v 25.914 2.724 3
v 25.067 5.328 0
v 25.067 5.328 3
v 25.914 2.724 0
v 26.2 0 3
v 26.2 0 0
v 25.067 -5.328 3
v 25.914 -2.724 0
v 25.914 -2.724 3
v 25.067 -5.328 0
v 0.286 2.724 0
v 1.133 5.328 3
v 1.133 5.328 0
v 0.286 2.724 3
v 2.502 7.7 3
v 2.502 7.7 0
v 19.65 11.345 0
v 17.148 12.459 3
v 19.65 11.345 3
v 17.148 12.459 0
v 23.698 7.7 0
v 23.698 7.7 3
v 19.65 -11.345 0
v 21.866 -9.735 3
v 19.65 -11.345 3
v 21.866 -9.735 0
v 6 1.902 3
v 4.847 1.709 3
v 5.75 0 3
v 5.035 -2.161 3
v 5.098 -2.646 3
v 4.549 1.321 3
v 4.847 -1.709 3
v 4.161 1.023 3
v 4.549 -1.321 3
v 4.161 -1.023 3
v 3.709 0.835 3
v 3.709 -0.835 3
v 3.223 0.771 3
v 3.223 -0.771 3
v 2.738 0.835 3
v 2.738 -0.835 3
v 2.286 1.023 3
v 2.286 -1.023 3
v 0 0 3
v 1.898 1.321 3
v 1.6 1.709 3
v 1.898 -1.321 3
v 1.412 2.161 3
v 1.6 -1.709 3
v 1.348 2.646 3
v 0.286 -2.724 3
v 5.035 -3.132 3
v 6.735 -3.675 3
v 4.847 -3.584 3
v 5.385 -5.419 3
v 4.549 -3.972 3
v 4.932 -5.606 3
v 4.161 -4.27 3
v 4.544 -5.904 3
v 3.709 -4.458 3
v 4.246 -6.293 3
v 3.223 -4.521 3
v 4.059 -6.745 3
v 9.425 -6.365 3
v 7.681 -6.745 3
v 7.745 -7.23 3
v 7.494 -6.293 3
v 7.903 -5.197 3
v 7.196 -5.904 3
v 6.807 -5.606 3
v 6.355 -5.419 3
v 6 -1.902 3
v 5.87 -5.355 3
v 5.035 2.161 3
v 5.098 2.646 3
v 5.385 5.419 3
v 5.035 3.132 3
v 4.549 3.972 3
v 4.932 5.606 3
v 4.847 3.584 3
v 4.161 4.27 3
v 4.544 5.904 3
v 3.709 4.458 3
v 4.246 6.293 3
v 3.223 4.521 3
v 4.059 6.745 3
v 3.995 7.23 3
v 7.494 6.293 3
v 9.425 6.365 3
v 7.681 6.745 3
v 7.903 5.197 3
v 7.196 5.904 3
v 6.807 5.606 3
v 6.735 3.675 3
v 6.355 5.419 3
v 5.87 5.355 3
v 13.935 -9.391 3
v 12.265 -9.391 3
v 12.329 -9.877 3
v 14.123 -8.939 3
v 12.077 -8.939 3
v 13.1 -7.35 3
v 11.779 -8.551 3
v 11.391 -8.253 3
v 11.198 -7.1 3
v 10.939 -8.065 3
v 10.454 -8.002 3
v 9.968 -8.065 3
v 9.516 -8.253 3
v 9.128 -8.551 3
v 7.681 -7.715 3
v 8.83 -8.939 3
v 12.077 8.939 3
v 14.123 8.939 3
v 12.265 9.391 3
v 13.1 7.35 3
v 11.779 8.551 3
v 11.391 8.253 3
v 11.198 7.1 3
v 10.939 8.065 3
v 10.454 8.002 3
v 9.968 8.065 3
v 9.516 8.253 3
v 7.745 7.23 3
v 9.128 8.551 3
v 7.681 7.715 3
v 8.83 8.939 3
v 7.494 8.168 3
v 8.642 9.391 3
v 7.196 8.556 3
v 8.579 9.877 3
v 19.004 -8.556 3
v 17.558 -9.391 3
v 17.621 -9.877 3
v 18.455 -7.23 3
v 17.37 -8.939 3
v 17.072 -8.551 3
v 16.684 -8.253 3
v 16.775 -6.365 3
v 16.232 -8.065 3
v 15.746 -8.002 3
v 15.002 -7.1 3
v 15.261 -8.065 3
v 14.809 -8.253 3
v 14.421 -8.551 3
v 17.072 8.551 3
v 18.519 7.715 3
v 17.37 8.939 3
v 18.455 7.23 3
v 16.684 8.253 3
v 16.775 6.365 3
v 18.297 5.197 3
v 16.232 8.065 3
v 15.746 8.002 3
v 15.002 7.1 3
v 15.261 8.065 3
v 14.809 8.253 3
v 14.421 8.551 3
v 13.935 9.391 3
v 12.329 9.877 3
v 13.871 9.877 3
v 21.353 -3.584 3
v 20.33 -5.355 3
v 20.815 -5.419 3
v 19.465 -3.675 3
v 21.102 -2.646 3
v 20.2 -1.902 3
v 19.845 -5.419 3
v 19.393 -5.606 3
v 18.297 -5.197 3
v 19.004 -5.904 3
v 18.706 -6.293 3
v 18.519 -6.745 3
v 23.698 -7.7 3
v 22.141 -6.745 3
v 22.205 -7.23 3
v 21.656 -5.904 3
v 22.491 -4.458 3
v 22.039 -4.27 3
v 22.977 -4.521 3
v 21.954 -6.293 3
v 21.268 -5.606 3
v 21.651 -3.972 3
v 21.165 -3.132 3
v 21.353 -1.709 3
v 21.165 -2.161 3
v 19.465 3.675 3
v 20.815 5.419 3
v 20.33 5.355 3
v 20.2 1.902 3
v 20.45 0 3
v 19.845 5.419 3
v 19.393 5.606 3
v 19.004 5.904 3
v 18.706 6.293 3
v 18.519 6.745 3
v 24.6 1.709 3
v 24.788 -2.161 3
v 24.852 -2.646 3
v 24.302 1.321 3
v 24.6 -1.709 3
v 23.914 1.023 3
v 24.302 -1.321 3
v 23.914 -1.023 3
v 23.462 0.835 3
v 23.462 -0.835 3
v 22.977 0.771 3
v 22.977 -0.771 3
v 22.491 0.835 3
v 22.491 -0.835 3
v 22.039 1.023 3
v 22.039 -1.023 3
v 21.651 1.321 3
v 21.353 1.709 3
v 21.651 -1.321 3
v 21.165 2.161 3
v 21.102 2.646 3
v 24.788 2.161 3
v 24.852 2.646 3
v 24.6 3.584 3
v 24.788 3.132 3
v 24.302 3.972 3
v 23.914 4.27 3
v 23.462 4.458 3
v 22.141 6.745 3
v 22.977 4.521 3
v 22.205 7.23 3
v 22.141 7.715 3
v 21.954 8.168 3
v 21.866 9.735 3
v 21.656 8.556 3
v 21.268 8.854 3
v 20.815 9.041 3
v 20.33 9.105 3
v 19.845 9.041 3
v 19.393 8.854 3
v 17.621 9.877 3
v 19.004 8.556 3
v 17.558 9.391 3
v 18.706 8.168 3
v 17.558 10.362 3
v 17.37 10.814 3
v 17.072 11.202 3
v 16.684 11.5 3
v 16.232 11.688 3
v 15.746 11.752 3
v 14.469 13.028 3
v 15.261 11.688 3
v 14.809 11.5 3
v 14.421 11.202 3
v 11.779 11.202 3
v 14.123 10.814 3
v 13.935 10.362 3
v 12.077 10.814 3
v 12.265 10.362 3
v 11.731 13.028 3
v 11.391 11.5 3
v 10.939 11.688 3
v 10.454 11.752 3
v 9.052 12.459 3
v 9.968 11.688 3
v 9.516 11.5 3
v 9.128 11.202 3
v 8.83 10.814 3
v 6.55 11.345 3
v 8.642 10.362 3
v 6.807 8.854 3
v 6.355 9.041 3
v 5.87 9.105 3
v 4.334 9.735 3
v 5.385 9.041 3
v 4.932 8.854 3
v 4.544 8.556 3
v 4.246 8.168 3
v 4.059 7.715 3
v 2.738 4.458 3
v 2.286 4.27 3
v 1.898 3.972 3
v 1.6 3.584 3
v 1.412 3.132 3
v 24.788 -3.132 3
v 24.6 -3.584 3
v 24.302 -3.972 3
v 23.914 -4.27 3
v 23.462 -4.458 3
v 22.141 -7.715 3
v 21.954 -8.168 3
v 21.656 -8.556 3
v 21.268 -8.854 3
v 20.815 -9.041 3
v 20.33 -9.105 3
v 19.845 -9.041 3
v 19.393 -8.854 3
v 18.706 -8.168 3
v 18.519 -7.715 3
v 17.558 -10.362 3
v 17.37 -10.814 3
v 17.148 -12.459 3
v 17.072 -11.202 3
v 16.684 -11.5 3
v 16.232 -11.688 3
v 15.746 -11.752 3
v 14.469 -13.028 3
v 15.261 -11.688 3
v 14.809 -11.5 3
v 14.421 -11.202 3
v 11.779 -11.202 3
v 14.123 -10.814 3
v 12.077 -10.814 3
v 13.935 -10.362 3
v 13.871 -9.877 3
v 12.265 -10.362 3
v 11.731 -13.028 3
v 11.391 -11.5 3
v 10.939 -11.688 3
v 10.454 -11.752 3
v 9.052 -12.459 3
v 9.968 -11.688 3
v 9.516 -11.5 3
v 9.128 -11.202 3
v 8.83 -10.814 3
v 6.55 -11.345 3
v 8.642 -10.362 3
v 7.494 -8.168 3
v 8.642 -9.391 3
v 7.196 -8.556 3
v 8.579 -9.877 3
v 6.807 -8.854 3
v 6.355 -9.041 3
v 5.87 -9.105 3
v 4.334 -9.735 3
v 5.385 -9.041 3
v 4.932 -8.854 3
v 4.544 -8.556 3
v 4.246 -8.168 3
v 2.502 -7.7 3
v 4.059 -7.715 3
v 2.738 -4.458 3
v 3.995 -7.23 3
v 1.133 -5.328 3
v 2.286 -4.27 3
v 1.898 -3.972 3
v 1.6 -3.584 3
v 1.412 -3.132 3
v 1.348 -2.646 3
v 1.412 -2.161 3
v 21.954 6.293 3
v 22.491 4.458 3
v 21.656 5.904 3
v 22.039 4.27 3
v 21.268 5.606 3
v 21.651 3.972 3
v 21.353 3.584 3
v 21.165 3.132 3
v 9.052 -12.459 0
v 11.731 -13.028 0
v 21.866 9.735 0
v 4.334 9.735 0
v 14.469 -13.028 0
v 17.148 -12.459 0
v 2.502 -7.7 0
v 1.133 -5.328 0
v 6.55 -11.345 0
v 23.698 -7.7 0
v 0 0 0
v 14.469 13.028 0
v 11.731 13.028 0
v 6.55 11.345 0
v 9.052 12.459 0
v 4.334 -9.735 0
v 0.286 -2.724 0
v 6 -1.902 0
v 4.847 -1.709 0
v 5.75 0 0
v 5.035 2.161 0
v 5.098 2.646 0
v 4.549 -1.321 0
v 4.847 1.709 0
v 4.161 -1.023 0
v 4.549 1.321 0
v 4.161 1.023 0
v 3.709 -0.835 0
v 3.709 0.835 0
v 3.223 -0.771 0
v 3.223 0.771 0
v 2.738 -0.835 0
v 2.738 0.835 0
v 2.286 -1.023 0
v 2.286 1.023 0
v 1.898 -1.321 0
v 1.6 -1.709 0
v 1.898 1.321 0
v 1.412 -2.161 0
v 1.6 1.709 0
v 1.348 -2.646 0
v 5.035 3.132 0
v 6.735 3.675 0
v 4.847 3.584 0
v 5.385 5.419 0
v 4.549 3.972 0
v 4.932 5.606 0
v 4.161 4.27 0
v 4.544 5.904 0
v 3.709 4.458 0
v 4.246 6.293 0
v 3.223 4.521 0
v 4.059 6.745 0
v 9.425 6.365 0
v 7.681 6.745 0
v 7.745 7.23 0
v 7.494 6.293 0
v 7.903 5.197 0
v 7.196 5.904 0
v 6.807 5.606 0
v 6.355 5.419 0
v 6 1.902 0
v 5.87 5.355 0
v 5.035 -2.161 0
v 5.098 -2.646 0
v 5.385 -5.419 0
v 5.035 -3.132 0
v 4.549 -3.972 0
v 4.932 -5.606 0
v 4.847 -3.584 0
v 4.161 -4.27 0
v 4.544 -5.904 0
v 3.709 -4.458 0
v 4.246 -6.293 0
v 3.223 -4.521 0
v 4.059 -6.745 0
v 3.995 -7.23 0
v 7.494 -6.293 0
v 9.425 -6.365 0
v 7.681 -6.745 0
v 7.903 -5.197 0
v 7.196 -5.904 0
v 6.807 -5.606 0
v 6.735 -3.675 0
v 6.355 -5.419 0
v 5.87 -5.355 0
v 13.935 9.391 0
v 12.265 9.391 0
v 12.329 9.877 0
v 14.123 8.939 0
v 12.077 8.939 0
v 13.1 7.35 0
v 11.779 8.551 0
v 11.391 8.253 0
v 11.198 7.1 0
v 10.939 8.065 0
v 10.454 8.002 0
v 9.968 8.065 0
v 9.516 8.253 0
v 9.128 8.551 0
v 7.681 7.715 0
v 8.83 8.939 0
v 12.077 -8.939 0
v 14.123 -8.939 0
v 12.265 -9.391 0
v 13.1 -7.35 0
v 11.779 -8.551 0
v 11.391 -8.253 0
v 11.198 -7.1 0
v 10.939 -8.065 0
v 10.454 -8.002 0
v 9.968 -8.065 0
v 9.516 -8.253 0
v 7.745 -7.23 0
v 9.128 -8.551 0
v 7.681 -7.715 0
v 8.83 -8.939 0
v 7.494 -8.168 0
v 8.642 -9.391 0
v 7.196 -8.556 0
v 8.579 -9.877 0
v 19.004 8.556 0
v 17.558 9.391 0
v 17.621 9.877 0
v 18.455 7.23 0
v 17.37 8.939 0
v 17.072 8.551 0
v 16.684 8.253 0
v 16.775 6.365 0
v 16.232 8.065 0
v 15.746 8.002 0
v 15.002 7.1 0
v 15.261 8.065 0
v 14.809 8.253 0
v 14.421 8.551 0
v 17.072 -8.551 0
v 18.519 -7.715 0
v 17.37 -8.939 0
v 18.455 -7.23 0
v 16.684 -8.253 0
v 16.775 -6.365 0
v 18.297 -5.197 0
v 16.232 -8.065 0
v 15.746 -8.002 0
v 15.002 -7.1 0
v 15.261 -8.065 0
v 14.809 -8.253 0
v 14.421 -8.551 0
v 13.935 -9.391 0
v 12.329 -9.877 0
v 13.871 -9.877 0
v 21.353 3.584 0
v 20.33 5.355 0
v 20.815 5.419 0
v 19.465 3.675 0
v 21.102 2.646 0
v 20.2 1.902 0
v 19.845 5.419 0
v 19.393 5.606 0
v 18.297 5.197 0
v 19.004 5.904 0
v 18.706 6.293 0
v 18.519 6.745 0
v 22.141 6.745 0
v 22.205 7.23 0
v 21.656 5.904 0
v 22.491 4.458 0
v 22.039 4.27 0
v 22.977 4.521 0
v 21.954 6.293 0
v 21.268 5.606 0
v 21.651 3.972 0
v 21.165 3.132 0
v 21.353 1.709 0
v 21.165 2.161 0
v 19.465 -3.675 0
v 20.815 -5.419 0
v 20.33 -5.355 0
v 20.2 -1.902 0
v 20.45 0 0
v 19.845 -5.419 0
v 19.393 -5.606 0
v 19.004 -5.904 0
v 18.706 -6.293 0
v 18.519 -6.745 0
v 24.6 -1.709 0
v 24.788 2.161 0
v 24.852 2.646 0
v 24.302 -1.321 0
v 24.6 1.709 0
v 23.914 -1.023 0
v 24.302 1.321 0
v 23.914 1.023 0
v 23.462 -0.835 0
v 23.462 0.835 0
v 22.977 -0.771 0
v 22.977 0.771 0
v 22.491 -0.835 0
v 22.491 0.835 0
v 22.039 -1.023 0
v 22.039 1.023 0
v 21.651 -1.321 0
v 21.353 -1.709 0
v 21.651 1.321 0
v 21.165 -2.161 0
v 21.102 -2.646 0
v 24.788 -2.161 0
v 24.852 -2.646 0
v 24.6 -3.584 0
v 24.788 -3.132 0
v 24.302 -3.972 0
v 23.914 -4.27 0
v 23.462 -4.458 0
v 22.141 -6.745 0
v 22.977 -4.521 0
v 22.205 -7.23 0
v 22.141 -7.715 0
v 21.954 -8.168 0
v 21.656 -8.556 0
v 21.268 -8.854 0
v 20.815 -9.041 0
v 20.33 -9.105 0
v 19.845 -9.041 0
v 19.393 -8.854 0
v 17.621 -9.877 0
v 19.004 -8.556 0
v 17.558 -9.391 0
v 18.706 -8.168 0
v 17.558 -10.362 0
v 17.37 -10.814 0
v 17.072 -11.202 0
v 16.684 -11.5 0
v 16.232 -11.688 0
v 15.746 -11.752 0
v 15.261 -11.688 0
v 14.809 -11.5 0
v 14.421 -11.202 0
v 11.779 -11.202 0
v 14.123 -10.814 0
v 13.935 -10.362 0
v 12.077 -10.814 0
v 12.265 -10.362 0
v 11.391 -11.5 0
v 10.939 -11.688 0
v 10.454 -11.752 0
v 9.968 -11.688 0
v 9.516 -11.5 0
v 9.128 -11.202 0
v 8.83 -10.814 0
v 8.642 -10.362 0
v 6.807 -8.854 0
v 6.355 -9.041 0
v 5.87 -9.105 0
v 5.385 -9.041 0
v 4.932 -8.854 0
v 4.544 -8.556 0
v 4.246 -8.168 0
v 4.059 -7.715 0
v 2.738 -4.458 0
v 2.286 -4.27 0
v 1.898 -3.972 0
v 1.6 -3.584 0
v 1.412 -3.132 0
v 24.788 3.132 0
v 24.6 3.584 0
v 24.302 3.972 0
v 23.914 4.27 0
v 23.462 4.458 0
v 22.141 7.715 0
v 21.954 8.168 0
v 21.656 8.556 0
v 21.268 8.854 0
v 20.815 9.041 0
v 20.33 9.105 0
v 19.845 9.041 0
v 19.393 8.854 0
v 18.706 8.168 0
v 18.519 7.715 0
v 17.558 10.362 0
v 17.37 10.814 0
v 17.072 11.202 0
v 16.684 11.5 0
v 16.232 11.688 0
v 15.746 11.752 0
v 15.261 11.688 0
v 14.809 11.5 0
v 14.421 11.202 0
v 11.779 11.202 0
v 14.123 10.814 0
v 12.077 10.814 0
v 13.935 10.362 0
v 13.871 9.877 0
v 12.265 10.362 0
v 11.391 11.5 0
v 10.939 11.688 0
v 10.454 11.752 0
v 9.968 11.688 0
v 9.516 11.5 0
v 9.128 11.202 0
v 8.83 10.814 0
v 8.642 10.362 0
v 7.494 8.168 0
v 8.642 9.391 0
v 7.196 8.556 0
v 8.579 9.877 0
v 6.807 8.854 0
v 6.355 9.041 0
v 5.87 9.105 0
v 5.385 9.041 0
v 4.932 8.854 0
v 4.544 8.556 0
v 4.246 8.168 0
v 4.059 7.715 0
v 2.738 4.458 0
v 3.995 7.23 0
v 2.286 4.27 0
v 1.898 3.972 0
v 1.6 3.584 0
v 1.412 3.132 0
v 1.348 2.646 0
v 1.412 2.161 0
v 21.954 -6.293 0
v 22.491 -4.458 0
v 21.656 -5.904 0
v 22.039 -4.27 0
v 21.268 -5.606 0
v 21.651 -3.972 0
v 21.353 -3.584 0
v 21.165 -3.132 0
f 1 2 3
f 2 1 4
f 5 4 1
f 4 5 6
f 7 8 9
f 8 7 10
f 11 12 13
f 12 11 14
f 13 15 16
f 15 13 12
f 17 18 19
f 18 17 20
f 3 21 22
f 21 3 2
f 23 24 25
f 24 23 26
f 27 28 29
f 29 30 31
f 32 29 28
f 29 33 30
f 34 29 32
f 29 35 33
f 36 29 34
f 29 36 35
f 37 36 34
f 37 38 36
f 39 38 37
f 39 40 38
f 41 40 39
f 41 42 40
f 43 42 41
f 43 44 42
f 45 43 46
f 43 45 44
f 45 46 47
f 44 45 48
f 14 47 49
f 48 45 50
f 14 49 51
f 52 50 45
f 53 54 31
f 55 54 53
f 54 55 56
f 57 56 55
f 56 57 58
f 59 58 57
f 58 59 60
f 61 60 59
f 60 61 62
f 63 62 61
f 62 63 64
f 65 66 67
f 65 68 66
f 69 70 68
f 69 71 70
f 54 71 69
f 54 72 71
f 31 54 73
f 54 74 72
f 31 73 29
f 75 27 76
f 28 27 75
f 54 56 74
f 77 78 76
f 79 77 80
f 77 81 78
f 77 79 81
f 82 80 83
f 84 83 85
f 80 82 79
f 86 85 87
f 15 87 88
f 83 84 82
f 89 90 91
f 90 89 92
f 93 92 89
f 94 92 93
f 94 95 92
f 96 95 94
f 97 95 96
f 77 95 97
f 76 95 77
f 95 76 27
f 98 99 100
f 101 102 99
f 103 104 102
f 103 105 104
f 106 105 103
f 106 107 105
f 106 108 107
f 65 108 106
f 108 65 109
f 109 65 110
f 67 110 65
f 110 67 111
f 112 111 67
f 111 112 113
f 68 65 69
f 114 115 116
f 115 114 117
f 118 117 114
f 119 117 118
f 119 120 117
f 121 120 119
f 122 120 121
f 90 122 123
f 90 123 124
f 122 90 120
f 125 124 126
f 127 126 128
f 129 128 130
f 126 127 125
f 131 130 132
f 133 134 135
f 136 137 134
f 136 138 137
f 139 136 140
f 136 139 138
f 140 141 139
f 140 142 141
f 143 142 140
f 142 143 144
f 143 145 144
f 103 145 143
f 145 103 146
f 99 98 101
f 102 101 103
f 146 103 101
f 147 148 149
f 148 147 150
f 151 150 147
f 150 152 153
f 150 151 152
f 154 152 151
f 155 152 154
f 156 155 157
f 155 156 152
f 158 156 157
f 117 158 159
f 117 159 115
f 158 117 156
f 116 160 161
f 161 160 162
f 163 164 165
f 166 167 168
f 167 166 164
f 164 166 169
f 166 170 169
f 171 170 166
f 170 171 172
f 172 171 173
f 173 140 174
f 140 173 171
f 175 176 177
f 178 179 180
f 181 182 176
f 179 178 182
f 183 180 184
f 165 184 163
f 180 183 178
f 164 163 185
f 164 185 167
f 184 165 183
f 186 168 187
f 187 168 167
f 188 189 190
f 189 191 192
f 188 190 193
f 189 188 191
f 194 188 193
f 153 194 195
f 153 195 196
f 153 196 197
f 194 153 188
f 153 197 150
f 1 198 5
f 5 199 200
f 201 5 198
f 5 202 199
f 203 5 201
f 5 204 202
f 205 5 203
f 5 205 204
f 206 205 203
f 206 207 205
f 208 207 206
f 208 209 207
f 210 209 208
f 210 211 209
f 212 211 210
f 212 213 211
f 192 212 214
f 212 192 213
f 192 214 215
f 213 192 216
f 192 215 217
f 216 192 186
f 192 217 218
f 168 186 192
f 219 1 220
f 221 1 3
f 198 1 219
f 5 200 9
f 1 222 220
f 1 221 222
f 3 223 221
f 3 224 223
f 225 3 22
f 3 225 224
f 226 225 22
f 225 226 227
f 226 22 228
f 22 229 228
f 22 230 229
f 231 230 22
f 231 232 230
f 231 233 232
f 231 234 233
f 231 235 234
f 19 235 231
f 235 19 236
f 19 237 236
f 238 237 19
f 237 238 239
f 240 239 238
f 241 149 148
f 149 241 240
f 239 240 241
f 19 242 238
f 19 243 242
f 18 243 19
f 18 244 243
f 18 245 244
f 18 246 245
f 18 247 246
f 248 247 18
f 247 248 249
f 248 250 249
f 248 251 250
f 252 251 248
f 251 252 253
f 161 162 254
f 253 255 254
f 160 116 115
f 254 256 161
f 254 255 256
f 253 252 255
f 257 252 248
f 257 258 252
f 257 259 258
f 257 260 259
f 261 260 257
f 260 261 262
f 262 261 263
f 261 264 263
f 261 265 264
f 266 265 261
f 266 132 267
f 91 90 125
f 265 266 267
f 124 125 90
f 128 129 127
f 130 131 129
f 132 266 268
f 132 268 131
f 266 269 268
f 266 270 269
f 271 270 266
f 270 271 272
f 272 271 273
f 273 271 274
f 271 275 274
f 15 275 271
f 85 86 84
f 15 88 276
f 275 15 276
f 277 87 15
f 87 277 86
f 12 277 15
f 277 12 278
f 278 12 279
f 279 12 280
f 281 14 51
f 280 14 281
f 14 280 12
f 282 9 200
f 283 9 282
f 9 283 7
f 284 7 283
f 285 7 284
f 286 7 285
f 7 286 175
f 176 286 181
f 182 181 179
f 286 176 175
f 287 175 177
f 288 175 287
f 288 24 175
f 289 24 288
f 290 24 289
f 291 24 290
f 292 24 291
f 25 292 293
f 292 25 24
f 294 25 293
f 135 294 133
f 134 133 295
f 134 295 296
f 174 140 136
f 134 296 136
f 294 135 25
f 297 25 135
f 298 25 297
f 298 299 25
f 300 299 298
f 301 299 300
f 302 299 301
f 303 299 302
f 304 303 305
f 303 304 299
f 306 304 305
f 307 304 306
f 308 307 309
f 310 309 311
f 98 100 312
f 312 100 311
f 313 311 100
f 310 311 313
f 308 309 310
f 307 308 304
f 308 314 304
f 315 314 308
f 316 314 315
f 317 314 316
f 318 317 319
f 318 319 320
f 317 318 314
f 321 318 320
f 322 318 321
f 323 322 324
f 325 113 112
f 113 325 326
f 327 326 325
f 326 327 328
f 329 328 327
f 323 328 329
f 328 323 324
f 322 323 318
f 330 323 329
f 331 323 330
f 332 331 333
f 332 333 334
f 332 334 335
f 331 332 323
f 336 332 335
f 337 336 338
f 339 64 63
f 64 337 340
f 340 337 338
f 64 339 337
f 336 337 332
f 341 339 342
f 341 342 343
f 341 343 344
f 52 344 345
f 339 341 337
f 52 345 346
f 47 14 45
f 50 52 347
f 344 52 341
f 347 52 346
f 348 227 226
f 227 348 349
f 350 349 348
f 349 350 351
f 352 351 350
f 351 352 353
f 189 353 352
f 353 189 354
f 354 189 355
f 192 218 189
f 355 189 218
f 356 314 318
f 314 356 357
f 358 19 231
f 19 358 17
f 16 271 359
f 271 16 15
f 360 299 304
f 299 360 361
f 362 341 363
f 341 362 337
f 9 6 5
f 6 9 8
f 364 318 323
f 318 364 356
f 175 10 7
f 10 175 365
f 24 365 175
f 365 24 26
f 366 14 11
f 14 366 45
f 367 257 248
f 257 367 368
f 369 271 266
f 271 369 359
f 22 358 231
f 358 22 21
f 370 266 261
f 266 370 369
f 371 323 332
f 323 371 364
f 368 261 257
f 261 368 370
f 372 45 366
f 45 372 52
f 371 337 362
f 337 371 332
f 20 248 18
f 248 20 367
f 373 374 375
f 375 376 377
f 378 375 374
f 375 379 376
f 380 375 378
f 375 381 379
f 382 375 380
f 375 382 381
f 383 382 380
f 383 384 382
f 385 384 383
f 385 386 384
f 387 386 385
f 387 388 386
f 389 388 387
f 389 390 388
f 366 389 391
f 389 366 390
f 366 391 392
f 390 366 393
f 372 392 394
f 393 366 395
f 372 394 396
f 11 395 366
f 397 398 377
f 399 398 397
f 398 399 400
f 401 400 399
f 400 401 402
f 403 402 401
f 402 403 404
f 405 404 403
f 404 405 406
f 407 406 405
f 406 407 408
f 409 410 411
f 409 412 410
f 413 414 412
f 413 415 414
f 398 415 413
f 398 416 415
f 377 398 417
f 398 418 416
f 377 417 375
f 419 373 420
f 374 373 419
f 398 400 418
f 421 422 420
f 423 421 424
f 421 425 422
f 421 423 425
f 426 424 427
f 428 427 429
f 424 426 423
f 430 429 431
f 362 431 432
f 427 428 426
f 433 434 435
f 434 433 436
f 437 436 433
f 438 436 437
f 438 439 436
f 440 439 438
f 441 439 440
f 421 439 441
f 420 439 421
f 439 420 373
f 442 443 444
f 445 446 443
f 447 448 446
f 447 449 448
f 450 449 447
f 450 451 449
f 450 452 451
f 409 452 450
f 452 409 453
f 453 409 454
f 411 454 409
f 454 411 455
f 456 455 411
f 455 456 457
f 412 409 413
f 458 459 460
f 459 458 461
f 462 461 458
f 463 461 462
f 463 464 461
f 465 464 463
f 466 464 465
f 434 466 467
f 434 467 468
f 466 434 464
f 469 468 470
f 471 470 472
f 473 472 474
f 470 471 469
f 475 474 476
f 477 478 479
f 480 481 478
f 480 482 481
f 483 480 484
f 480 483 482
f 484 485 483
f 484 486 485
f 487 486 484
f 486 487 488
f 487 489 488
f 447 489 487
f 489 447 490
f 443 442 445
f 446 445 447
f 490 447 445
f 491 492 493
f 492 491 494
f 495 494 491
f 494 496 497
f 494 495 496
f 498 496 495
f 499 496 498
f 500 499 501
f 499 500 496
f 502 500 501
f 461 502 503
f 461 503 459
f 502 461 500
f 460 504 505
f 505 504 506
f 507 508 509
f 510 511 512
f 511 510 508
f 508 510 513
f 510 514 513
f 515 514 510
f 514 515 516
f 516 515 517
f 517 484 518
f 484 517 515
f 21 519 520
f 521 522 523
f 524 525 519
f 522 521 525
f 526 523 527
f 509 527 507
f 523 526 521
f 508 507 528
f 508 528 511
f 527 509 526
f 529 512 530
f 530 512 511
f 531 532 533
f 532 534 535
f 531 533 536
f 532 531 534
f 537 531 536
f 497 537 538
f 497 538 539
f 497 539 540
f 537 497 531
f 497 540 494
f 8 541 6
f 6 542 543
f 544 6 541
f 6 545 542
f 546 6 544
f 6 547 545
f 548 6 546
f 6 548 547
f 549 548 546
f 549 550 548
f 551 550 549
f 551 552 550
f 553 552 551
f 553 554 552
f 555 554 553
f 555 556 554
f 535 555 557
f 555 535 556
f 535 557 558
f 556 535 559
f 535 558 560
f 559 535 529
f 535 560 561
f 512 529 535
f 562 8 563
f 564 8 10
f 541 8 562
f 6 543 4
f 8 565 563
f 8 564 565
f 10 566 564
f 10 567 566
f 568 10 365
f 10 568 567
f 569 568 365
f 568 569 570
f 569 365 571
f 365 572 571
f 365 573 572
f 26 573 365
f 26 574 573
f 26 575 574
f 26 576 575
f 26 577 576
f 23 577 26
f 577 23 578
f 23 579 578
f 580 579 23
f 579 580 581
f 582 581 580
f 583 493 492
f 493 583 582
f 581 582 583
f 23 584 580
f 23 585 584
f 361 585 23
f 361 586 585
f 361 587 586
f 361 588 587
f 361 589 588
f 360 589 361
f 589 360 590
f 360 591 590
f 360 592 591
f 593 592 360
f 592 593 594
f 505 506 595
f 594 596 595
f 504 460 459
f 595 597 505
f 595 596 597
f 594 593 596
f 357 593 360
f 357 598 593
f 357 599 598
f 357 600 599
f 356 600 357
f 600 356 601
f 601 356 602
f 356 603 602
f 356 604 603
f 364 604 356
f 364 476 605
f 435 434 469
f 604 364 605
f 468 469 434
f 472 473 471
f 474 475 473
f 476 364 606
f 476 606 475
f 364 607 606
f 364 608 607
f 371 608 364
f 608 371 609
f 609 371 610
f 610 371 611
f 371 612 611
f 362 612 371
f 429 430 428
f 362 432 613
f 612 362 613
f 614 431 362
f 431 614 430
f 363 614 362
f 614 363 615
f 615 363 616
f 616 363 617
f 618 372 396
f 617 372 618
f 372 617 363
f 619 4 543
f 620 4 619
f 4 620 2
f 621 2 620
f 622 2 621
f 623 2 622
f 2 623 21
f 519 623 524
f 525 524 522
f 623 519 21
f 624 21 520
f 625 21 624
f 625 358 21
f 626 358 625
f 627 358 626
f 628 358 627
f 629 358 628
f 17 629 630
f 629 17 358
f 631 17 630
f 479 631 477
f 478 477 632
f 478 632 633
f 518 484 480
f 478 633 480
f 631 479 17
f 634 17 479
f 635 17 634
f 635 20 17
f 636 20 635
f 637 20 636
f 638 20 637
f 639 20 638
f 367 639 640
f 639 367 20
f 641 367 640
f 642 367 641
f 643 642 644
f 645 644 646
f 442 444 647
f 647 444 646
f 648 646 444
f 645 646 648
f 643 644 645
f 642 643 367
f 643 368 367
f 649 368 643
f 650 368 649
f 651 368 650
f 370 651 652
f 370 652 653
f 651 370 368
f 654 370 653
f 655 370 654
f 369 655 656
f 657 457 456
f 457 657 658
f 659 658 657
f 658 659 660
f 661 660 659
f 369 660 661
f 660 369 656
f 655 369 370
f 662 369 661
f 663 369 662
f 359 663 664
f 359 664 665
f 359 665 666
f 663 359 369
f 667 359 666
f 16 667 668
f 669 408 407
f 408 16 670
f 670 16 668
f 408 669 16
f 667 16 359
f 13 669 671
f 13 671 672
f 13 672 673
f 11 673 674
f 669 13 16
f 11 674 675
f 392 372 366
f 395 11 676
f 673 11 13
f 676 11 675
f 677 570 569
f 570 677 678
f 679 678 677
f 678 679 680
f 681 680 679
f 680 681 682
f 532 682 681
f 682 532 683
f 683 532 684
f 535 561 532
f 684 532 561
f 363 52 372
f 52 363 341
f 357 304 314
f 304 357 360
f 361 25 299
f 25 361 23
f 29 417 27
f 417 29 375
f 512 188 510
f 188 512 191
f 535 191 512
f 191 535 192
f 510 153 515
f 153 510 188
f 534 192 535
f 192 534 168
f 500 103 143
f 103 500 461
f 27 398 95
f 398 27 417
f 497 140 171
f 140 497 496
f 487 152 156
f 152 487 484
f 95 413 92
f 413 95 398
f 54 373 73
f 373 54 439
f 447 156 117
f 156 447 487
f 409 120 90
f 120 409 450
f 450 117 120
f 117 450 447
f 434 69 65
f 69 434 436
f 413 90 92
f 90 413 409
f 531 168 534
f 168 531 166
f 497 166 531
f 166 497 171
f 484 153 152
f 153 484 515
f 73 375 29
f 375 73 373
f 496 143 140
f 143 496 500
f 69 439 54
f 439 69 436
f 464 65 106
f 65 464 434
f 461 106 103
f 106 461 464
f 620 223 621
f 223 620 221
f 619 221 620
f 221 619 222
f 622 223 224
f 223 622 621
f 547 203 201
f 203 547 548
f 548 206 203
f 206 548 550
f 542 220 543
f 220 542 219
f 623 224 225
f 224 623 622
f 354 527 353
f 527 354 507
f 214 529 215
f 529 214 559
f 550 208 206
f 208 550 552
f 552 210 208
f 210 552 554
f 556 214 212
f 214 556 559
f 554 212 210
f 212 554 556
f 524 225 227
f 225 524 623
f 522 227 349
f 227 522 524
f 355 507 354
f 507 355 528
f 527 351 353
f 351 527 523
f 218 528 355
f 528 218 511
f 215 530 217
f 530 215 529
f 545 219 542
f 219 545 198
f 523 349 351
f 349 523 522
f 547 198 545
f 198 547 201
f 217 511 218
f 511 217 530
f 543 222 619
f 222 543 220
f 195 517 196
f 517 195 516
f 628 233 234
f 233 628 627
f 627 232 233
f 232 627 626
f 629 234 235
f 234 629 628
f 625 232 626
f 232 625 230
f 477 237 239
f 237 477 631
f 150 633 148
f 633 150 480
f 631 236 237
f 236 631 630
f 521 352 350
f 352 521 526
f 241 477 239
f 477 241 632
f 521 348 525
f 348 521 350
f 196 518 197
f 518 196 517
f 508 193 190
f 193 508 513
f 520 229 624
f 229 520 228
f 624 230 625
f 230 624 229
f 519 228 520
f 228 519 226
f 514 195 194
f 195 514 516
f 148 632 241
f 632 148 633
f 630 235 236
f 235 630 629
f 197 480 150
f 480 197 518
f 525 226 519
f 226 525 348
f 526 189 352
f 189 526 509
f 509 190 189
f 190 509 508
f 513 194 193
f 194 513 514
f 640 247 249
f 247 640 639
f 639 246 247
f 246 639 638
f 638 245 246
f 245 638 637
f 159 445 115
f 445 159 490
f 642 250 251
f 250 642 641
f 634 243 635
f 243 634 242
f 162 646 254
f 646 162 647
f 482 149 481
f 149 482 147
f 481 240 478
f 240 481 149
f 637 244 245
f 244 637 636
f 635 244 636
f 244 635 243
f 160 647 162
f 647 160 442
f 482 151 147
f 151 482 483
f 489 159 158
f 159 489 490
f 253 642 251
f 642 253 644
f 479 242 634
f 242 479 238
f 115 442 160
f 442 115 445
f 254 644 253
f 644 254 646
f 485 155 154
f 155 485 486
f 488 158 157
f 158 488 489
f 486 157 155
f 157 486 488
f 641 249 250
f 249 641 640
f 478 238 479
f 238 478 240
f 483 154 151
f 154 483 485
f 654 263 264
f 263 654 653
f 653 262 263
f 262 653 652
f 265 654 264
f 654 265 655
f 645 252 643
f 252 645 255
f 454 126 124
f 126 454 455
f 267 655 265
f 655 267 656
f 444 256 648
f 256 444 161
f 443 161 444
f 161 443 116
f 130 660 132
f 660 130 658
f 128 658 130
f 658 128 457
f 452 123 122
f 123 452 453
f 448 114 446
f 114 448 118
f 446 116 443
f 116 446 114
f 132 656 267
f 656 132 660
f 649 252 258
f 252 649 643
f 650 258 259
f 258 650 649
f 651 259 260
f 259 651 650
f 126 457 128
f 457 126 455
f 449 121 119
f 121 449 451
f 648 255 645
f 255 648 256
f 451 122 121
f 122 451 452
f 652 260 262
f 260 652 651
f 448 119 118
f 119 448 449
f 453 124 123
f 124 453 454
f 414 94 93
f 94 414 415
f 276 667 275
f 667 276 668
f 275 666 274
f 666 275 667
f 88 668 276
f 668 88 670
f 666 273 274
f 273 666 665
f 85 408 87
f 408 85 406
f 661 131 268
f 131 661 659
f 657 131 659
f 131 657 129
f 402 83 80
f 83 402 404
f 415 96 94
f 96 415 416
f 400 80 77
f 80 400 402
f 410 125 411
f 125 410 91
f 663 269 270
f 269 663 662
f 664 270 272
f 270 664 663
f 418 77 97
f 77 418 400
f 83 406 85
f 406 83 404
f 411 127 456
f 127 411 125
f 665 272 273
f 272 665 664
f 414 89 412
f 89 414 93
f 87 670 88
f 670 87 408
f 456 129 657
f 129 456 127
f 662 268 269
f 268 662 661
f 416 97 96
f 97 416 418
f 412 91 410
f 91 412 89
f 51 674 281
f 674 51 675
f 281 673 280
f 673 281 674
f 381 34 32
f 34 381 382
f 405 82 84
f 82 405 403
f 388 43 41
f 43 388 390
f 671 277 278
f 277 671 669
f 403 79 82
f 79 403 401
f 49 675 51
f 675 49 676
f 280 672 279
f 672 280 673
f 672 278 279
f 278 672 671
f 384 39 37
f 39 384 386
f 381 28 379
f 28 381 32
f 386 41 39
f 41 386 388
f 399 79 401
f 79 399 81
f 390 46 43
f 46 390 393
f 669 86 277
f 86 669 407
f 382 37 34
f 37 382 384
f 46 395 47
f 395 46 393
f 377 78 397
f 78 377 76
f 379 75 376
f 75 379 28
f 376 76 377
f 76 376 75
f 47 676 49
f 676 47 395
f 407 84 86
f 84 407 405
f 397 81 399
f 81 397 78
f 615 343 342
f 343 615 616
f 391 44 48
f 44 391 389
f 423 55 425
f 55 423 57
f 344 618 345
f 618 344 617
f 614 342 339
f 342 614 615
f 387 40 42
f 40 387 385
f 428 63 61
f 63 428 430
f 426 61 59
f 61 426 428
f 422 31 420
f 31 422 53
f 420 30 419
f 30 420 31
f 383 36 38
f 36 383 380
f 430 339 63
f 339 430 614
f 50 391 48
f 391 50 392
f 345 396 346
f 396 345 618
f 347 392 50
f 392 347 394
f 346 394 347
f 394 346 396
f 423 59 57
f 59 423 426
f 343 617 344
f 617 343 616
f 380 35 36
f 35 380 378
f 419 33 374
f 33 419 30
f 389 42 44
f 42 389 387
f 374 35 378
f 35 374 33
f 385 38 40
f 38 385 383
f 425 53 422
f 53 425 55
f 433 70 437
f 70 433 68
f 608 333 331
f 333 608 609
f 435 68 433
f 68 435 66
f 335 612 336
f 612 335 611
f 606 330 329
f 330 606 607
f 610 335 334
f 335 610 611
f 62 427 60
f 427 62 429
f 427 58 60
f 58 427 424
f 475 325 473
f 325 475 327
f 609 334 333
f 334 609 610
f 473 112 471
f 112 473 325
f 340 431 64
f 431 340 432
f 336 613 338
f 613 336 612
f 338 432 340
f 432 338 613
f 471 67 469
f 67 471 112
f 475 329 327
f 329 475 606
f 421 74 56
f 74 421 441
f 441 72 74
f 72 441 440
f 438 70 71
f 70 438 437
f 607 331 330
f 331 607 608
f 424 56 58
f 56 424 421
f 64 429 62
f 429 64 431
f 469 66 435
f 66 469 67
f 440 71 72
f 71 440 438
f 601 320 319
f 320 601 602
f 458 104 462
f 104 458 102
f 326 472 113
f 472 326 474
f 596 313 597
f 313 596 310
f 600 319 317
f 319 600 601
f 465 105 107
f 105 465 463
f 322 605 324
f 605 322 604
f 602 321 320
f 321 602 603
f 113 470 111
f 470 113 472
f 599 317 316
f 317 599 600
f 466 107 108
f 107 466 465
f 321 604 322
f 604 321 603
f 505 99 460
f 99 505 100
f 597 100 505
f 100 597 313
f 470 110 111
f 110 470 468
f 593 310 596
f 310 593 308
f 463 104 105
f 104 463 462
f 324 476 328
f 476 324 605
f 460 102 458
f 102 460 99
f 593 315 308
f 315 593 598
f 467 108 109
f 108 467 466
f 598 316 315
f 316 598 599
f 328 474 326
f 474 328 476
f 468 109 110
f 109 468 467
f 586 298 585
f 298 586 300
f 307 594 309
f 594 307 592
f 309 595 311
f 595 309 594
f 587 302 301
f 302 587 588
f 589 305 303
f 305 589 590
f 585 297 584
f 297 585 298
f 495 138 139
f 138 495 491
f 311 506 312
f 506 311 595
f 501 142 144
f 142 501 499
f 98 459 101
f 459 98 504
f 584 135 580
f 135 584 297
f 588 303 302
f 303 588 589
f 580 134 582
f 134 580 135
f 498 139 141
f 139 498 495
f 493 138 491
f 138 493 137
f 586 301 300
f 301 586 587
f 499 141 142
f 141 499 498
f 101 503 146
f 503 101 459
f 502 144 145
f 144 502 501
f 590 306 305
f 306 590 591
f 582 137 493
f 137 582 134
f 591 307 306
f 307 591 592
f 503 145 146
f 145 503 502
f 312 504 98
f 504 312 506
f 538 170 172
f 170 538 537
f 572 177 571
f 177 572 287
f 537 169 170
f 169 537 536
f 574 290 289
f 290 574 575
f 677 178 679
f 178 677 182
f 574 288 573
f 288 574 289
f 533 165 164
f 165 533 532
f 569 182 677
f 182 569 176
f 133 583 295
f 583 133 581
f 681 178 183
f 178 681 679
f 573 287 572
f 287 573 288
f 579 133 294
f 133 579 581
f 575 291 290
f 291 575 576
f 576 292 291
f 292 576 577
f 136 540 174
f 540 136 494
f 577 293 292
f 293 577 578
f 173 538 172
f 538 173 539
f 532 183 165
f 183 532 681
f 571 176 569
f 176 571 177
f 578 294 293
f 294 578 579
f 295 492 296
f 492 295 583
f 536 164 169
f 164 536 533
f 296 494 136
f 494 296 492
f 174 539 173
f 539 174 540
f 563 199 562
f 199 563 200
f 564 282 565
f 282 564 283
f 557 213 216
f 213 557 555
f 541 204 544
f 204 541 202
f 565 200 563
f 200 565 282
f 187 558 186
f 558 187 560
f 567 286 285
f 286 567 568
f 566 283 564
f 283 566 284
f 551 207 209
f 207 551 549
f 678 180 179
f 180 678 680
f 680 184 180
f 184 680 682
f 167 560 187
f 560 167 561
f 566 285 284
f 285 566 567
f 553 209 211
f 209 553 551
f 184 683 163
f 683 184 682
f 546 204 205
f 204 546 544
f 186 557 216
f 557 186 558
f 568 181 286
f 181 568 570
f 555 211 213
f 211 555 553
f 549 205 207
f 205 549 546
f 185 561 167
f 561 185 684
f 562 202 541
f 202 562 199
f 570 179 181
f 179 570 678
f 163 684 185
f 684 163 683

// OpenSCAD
//a Version notes
// First versions have inner_d for AA batteries of 14.7; this is probably a teensy bit tight

//a Globals
module holey_cylinder( outer_d, inner_d, h, ncircles=12, thickness=2 )
{
 circle_angle = 360/ncircles;
 circle_d = (outer_d-inner_d-2*thickness)/2;
 translate([outer_d/2,0,0])
   difference()
   {
     difference()
       {
	 cylinder( r=outer_d/2, h=h );
	 cylinder( r=inner_d/2, h=h );
       }
         for (i=[0:ncircles-1])
	    {
	      rotate([0,0,(i+0.5)*circle_angle])
		translate( [circle_d/2+inner_d/2+thickness/2,0,0] )
		cylinder( r=circle_d/2, h=h, $fs=0.5 );
	    }
   }
}

module aa_to_c_adapter()
{
 holey_cylinder( outer_d = 26.2,
		 inner_d = 14.7,
		 thickness = 2,
		 ncircles = 12,
		 h       = 3.0 );
}

!aa_to_c_adapter();
